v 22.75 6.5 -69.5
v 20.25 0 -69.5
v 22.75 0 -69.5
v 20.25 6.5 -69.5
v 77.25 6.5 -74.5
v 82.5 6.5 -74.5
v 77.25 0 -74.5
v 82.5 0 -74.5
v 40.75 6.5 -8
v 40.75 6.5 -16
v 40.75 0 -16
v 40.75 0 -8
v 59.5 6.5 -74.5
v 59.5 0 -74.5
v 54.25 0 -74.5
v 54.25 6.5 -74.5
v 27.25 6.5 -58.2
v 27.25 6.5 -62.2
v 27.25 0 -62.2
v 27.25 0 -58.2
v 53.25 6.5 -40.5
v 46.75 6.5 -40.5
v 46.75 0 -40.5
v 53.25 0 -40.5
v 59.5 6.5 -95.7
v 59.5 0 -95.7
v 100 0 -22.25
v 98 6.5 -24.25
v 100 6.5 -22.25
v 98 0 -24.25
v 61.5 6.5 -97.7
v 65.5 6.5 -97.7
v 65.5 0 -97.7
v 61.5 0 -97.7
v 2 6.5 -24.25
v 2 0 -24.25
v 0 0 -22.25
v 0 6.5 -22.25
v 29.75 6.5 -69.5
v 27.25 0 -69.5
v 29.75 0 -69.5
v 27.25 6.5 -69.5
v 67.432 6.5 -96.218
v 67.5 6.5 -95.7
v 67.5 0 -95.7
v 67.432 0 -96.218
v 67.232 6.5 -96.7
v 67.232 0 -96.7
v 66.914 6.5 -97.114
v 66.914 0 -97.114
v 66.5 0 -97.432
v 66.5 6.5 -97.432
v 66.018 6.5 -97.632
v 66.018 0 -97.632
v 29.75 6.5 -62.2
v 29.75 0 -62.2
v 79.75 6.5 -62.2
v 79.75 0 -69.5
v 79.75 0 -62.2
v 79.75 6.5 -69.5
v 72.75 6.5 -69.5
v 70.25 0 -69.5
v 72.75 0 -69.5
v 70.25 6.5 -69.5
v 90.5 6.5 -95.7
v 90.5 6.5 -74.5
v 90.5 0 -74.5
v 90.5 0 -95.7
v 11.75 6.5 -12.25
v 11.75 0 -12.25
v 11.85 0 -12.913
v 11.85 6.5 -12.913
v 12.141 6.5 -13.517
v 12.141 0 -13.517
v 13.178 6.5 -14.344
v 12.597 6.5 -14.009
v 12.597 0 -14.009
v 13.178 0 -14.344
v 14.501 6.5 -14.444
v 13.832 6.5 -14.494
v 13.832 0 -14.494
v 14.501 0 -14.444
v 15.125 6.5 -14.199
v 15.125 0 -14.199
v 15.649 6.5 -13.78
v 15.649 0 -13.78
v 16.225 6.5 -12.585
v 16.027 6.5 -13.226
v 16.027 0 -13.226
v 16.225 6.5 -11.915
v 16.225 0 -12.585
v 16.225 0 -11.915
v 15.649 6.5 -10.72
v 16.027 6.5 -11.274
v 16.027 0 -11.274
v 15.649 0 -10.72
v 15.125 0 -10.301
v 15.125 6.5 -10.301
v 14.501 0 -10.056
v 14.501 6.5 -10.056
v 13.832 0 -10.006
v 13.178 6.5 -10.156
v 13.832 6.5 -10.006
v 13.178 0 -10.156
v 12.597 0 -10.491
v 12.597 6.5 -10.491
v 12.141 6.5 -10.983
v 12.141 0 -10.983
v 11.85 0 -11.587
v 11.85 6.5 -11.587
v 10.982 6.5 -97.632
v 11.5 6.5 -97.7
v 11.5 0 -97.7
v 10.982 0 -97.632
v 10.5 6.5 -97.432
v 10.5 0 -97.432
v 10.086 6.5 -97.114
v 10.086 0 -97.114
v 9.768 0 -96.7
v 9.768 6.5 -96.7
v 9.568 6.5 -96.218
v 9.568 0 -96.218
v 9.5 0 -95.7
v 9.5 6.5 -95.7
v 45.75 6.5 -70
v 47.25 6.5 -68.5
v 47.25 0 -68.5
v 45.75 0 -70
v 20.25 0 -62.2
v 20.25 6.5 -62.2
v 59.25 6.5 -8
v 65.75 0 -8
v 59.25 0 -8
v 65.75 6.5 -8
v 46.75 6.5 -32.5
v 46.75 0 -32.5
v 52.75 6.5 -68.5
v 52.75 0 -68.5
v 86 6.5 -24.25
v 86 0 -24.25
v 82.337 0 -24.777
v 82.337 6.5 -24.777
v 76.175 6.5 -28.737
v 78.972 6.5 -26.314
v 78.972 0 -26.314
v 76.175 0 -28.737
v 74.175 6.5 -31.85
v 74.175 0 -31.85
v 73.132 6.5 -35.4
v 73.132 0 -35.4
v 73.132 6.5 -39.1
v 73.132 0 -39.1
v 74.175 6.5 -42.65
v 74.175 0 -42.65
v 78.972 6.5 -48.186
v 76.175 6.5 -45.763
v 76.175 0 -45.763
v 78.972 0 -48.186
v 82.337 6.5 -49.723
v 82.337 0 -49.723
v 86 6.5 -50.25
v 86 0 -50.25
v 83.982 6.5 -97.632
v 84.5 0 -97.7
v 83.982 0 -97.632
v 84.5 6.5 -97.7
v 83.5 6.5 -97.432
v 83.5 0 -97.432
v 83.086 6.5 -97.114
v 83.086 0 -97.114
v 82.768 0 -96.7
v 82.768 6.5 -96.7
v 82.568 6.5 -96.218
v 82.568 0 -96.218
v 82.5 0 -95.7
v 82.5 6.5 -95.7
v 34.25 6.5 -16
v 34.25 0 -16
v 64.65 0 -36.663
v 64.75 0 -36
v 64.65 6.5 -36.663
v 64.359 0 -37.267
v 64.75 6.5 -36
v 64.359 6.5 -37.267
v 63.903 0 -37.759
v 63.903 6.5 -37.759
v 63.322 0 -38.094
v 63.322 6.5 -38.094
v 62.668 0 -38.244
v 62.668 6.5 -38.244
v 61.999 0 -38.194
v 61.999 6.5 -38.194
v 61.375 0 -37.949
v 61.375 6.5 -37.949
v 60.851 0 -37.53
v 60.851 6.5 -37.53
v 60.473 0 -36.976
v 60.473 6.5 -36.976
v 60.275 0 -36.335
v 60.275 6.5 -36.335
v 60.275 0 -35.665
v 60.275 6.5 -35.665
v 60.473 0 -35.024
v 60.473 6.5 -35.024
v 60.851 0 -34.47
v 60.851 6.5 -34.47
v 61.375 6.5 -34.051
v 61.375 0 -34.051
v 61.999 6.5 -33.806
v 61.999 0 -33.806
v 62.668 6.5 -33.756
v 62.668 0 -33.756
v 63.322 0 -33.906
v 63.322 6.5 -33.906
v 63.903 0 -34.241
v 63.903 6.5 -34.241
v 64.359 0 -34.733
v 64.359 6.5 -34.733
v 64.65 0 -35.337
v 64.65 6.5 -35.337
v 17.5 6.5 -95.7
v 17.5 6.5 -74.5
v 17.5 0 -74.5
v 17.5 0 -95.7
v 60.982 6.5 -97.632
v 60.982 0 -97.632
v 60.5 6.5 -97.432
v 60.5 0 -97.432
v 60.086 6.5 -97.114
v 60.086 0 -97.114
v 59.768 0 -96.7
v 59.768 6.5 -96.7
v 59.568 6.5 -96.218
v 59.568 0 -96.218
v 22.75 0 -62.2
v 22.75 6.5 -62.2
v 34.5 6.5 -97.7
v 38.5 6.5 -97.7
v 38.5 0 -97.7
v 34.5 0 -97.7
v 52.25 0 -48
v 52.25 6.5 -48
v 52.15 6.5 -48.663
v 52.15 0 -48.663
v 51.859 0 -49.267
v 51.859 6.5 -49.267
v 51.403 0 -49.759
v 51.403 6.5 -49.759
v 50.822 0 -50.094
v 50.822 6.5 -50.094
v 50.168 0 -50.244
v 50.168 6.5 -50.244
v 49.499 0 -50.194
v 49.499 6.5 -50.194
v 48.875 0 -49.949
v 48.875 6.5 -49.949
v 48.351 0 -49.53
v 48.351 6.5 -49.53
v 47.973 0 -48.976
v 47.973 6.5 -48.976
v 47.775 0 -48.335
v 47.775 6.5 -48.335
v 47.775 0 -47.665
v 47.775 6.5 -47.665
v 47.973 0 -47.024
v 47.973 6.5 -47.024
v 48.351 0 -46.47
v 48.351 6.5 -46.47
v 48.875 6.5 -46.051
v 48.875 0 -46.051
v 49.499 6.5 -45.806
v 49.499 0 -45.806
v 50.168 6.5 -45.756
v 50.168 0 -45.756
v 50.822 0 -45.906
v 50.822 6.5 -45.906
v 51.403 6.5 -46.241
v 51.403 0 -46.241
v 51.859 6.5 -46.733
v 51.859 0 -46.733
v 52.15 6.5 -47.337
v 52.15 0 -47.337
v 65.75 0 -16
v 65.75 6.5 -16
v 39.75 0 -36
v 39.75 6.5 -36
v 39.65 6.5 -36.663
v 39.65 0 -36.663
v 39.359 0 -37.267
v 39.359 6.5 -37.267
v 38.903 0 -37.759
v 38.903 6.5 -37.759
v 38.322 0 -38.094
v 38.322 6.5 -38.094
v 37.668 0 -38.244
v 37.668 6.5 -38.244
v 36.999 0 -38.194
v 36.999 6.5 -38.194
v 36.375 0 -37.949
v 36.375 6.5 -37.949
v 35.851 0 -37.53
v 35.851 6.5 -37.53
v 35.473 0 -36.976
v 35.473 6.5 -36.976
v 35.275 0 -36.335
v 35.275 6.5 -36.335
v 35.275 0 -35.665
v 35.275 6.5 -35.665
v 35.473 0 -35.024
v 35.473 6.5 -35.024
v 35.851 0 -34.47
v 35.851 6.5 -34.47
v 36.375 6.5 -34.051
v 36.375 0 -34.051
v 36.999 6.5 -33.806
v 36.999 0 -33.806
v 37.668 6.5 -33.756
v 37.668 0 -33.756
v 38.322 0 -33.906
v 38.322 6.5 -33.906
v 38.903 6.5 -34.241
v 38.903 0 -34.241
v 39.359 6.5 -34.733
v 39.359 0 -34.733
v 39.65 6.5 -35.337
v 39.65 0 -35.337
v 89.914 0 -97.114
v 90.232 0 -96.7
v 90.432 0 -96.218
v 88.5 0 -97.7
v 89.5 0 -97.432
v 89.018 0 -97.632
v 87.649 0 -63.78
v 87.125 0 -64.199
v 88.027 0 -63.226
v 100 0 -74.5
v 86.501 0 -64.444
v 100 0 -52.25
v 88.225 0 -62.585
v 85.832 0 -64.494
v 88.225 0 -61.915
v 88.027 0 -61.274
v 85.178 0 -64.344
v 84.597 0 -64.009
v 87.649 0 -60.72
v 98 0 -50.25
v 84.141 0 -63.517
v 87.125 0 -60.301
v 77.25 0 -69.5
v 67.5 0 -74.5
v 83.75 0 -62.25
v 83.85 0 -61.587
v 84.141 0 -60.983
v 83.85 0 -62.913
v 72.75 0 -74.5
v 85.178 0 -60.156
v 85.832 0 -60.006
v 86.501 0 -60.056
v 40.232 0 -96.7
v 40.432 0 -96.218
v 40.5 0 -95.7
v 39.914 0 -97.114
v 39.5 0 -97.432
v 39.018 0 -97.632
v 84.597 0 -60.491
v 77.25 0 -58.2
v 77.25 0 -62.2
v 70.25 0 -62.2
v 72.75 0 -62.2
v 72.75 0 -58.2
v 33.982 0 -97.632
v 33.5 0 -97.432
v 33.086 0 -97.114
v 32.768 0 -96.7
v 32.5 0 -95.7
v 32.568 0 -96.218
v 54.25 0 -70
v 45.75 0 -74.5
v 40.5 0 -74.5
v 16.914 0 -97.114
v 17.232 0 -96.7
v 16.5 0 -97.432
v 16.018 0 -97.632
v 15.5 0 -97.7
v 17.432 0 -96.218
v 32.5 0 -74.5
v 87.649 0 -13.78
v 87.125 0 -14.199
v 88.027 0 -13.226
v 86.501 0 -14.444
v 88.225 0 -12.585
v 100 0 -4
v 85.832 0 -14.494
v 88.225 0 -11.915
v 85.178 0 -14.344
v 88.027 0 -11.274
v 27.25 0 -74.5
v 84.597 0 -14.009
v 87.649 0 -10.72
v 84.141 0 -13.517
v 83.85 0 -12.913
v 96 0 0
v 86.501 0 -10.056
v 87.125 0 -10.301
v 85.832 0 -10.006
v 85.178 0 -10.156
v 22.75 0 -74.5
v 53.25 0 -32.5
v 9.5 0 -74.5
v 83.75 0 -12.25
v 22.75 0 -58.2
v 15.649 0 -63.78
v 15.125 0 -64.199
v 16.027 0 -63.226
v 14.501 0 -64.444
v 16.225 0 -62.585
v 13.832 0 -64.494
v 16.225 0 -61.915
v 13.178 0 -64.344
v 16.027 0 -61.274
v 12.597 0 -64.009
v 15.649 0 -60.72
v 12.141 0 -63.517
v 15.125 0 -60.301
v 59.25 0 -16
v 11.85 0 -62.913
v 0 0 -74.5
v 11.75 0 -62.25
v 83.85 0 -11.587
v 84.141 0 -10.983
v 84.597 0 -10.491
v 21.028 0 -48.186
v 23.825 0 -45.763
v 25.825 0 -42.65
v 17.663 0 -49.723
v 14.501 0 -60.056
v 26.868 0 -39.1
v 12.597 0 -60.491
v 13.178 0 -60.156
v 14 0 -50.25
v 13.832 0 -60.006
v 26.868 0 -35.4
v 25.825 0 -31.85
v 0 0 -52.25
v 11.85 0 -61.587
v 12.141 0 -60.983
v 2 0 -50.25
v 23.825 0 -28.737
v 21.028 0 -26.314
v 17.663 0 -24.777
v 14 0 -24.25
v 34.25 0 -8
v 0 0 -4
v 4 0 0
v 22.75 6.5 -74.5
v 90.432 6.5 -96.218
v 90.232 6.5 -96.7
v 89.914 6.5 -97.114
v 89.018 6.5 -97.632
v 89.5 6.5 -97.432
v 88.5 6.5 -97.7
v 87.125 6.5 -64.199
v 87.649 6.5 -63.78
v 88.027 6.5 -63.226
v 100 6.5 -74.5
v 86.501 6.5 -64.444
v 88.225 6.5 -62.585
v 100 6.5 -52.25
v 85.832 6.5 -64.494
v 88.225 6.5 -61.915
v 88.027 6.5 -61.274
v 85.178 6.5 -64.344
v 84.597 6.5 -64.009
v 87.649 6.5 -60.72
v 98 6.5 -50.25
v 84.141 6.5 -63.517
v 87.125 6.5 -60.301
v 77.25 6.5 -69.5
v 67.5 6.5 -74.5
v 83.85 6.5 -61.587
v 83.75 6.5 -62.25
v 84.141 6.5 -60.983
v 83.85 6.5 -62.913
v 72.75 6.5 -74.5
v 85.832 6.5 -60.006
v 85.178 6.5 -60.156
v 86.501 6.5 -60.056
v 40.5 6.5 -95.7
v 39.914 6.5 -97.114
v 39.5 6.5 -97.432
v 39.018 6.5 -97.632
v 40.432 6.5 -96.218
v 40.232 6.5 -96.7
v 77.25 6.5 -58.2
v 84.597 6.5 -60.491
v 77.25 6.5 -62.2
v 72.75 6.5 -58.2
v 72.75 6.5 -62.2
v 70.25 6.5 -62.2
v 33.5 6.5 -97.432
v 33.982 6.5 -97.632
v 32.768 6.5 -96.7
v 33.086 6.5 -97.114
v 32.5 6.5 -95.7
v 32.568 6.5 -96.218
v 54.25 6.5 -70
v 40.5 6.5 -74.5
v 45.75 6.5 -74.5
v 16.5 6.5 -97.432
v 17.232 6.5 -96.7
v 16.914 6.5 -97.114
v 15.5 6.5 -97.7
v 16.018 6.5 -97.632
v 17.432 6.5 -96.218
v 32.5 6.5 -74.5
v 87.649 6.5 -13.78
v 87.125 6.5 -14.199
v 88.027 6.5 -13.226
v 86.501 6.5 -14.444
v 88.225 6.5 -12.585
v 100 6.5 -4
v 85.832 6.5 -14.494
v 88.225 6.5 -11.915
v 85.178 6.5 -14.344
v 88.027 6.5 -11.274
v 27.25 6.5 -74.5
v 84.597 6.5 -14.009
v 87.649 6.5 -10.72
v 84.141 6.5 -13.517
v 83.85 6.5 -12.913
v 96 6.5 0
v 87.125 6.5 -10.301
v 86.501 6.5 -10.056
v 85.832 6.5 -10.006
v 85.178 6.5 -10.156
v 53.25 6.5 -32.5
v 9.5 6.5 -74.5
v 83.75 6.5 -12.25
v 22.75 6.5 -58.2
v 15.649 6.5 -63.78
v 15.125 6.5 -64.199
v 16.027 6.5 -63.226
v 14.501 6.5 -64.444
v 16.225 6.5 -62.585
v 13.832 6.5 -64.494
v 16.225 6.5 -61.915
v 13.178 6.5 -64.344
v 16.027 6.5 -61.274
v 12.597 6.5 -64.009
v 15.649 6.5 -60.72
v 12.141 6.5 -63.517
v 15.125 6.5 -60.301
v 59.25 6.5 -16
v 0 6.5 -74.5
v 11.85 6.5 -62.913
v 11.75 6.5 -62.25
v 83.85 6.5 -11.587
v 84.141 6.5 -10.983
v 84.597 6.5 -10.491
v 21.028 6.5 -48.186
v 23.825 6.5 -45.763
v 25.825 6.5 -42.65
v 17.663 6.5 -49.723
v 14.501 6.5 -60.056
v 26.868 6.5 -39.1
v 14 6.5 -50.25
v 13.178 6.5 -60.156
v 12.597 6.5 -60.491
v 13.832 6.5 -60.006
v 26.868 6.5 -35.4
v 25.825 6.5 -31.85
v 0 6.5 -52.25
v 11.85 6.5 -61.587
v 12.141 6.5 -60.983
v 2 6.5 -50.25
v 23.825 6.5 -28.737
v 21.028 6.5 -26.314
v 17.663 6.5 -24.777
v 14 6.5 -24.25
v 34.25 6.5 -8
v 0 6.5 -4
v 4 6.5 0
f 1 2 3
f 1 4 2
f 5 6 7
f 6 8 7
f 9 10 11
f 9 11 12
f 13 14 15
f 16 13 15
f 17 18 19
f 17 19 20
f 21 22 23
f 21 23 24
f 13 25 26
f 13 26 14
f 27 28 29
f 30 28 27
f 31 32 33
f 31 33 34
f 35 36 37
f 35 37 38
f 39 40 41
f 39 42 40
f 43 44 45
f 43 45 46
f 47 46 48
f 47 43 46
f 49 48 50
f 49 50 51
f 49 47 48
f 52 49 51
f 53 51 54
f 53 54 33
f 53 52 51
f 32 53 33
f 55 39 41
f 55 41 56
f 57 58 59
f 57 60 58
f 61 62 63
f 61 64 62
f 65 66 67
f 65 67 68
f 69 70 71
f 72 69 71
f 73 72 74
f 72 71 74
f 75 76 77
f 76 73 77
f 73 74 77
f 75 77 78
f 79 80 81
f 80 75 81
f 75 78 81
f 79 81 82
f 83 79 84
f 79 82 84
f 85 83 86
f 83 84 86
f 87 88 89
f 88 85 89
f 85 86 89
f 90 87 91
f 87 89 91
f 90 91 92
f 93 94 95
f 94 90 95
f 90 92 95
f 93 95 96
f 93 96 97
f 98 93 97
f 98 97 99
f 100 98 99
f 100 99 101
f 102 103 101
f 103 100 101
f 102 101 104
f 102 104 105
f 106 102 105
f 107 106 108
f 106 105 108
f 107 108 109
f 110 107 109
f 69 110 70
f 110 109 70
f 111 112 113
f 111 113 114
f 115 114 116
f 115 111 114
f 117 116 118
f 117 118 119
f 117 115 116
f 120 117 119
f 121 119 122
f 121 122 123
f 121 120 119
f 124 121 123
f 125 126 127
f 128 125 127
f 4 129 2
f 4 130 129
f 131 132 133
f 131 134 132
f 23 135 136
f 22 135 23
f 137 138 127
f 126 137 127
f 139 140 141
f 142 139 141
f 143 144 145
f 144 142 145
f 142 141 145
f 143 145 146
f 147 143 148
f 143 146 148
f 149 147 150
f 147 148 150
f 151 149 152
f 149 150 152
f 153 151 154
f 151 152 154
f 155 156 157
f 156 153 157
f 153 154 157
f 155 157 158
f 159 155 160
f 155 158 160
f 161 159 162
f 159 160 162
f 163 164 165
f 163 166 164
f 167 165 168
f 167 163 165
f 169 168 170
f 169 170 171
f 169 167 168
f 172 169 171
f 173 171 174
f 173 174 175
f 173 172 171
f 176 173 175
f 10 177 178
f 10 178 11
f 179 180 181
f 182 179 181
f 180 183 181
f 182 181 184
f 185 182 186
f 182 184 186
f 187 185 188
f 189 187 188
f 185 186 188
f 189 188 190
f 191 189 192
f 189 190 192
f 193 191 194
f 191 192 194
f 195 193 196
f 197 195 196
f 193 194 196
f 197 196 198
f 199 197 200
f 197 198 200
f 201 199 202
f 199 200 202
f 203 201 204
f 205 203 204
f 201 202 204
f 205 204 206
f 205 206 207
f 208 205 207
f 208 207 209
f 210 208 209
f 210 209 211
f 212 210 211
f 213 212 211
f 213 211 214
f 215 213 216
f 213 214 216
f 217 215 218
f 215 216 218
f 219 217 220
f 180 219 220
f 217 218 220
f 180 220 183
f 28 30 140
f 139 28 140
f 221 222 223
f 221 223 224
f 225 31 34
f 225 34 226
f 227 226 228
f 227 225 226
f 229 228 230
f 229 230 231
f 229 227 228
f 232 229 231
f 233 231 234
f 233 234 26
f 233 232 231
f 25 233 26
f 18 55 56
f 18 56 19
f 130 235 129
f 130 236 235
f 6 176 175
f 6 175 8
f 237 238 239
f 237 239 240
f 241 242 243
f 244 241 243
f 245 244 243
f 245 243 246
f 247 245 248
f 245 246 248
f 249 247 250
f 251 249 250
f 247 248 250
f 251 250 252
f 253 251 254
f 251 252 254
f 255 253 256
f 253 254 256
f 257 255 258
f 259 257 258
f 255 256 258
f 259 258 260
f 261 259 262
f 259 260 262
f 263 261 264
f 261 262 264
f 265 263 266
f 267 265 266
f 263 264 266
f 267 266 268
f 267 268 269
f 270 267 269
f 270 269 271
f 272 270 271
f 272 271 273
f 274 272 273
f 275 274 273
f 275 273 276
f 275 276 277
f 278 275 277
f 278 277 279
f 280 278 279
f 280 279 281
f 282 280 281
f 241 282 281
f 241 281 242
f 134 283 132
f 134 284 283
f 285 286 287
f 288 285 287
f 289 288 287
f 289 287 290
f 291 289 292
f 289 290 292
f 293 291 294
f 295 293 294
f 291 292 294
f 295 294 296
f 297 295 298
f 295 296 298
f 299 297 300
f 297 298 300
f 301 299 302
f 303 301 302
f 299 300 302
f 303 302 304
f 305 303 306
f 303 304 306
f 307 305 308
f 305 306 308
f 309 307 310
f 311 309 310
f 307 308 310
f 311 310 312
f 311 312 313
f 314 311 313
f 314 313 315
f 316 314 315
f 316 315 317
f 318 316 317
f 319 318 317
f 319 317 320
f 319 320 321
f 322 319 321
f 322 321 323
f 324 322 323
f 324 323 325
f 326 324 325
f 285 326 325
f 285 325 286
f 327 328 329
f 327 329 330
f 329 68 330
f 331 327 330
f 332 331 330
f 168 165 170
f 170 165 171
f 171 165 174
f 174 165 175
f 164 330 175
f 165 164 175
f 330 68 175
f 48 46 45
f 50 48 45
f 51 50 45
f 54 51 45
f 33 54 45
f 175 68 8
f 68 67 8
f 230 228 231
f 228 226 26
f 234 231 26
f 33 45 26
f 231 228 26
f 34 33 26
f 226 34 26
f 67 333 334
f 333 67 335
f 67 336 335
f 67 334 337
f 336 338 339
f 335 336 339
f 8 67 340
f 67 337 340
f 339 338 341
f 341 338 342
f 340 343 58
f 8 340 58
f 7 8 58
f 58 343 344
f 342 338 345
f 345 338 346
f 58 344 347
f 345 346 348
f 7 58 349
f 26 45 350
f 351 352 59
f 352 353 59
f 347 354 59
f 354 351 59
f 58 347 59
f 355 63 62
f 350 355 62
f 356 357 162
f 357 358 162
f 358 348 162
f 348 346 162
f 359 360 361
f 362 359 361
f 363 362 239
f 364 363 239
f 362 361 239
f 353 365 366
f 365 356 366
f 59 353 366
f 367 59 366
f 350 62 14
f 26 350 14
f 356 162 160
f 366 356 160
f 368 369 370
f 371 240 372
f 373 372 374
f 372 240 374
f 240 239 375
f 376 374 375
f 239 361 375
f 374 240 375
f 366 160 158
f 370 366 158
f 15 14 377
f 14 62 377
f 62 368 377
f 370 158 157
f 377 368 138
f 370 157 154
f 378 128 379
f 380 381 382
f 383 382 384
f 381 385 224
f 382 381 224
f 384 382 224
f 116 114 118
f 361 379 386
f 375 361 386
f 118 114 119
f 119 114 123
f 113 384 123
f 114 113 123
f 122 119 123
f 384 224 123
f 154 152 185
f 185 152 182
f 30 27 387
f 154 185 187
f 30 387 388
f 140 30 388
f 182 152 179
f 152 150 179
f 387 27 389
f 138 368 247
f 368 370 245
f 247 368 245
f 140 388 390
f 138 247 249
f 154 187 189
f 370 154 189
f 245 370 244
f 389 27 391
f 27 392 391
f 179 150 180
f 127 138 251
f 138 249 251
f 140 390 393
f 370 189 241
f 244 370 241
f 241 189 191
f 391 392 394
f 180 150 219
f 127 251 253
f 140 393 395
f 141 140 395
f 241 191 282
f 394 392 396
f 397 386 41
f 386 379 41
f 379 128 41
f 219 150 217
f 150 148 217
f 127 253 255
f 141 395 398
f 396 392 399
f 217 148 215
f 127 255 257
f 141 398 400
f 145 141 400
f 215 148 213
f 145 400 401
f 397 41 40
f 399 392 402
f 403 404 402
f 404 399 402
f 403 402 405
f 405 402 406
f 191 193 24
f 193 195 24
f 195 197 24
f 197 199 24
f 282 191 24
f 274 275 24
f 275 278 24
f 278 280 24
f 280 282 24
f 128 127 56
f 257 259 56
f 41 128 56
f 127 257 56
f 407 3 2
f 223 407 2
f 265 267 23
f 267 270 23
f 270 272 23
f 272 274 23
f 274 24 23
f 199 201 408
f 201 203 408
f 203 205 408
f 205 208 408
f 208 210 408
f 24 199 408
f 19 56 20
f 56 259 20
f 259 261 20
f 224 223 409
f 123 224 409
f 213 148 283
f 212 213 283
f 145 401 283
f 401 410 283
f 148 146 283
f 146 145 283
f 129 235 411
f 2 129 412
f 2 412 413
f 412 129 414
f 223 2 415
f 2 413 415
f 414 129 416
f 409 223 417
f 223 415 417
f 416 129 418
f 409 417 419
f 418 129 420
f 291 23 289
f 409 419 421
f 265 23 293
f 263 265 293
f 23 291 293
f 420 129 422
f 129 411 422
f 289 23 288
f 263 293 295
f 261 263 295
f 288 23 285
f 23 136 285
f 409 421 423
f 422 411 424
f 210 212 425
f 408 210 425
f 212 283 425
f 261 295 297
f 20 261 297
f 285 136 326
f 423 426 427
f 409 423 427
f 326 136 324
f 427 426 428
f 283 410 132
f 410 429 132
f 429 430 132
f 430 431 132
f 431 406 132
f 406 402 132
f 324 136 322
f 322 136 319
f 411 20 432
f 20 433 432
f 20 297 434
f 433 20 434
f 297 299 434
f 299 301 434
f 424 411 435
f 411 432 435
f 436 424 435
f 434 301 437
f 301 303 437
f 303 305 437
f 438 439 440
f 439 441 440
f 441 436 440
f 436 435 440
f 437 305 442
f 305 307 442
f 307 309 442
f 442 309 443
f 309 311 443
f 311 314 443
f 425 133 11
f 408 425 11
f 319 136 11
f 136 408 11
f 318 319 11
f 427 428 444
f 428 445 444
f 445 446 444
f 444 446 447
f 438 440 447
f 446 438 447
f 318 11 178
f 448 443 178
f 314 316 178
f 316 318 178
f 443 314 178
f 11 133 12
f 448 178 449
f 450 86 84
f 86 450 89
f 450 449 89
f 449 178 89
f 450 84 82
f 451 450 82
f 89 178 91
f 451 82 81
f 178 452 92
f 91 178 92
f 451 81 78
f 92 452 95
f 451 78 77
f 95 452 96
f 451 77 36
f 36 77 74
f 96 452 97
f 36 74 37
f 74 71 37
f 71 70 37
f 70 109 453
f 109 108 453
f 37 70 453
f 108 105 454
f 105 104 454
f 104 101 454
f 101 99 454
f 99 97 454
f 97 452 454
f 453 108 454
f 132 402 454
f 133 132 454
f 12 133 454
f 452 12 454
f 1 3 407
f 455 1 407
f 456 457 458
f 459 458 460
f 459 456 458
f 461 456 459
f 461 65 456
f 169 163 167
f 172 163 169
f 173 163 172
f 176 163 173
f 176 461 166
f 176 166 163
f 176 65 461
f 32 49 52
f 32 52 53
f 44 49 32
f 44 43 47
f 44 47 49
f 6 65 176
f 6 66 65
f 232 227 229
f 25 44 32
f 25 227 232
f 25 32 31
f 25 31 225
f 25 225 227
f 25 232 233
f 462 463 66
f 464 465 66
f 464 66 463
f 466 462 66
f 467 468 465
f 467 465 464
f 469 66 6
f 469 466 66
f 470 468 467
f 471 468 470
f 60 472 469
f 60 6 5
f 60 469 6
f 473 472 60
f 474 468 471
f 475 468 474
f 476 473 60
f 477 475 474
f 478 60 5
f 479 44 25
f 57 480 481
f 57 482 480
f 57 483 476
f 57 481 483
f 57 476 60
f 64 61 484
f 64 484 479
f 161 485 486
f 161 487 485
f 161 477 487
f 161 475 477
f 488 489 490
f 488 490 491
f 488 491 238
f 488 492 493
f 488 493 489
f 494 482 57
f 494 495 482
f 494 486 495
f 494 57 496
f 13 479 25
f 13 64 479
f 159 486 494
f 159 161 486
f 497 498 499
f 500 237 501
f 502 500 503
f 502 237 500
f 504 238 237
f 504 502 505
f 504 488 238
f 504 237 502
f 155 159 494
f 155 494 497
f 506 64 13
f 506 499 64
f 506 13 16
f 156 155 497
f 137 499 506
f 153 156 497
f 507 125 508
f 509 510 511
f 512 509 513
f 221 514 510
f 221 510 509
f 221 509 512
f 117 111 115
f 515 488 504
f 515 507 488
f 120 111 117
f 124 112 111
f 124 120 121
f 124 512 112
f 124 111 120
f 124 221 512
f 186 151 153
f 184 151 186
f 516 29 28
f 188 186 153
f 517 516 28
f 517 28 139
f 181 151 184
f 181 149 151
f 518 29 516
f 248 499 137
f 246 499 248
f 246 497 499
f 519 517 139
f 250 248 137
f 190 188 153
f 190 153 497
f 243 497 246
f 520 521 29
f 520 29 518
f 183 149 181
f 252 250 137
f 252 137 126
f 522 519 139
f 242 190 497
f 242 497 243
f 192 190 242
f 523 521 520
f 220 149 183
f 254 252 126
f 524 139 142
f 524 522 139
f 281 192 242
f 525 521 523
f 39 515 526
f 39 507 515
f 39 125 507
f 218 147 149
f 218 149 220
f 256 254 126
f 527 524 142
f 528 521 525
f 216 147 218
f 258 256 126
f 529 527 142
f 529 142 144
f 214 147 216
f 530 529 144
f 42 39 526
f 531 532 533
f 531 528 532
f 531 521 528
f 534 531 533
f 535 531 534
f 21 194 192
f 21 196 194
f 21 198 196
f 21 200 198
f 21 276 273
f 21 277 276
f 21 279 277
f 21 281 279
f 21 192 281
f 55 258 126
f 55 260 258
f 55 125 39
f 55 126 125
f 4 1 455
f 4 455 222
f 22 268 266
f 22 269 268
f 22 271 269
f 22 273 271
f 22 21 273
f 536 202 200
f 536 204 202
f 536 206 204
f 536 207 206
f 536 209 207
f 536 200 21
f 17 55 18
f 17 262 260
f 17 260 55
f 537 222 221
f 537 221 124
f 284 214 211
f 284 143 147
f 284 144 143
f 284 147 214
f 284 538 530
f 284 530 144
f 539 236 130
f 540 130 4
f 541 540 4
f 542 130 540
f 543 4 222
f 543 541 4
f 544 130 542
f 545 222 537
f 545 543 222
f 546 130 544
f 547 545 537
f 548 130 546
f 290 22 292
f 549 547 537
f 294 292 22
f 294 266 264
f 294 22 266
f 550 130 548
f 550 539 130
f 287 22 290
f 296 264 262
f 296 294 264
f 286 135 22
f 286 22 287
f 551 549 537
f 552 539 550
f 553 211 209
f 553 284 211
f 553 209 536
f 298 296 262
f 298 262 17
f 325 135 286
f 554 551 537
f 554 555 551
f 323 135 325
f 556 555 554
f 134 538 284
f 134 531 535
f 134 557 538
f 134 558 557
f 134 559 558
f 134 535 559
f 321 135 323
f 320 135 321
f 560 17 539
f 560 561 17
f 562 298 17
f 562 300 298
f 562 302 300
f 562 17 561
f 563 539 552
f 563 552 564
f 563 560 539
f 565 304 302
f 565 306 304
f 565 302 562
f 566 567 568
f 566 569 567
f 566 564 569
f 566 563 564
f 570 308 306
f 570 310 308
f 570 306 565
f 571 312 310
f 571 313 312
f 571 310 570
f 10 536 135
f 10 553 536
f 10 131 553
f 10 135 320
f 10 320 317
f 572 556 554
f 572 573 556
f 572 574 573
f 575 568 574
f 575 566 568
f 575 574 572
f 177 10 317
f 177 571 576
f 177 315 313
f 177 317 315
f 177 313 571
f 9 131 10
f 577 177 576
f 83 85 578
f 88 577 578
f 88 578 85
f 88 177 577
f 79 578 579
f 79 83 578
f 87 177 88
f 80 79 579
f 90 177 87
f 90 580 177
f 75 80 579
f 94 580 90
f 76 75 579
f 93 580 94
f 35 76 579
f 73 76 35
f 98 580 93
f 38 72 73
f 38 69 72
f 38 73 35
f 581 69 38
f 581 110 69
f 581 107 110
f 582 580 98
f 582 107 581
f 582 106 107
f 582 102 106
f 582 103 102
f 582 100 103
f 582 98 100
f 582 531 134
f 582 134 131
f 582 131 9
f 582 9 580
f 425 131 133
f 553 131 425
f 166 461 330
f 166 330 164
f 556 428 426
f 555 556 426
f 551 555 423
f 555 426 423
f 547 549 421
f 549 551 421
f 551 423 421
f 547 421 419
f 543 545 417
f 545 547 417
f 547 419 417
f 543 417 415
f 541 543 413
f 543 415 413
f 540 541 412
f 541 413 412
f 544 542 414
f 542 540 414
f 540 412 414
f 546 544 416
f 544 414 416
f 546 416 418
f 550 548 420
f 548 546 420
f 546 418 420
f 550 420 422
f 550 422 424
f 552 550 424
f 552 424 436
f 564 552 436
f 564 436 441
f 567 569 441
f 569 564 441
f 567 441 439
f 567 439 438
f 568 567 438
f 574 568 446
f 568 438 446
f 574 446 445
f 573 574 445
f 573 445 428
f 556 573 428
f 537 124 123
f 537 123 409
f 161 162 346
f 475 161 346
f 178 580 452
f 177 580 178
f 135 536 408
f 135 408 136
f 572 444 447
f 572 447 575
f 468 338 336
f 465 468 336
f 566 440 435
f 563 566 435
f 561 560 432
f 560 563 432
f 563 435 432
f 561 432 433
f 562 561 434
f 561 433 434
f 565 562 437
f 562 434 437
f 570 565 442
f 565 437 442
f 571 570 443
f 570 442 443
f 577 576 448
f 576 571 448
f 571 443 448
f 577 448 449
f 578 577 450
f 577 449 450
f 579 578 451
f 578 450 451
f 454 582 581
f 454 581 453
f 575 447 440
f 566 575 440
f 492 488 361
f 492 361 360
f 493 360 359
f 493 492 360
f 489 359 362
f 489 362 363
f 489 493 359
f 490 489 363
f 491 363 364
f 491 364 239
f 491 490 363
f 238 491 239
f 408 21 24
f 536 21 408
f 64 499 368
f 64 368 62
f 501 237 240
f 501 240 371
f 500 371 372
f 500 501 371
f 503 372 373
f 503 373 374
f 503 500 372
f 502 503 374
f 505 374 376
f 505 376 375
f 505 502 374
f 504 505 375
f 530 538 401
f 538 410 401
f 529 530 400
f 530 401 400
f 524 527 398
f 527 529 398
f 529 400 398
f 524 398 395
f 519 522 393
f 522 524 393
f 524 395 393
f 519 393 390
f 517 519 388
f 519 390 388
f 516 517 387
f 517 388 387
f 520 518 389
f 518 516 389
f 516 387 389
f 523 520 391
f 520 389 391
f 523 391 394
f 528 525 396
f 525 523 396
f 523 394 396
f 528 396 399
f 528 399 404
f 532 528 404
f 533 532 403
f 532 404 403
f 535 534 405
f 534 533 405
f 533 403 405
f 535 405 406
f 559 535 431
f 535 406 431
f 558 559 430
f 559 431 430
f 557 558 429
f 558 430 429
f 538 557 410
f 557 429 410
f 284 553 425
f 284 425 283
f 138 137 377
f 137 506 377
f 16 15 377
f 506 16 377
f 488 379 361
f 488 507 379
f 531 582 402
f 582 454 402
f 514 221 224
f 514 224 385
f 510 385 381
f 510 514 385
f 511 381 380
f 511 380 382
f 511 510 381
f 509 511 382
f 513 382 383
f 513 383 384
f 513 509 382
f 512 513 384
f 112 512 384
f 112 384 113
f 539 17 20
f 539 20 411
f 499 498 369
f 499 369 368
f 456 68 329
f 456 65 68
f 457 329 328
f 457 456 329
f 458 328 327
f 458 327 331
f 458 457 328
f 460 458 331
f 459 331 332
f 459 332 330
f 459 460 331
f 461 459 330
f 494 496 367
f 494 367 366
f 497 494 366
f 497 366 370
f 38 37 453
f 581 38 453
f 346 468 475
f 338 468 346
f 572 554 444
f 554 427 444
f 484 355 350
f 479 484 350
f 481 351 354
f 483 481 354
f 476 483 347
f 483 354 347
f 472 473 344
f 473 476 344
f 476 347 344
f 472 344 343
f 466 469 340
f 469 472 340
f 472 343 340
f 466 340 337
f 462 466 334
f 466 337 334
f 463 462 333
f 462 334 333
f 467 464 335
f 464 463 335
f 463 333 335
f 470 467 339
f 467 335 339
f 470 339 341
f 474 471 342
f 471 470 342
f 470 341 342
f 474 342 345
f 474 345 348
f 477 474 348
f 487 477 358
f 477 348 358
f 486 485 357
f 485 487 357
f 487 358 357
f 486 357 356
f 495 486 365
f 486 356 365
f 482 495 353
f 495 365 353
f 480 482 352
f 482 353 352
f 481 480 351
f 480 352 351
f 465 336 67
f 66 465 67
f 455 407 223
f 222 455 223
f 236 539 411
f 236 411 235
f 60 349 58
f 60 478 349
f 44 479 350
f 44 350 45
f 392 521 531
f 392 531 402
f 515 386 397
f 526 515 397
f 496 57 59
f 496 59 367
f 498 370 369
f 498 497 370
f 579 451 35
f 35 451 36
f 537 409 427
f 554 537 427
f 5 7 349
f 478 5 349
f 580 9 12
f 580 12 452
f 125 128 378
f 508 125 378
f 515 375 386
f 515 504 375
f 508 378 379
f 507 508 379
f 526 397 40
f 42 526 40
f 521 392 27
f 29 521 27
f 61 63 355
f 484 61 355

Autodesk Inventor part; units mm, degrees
ref_plane "YZ Plane" through (0, 0, 0) normal (1, 0, 0) x (0, 1, 0)
ref_plane "XZ Plane" through (0, 0, 0) normal (0, 1, 0) x (-1, 0, 0)
ref_plane "XY Plane" through (0, 0, 0) normal (0, 0, 1) x (1, 0, 0)
sketch "Sketch1" plane through (0, 0, 0) normal (0, 1, 0) x (-1, 0, 0)
  line L0 (0, 0) -> (-100, 0)
  line L1 (-100, 0) -> (-100, -24.25)
  line L2 (-100, -24.25) -> (-86, -24.25)
  arc A0 (-86, -50.25) -> (-86, -24.25) centre (-86, -37.25) ccw
  line L3 (-86, -50.25) -> (-100, -50.25)
  line L4 (-100, -50.25) -> (-100, -74.5)
  line L5 (-100, -74.5) -> (0, -74.5)
  line L6 (0, -74.5) -> (0, -50.25)
  line L7 (0, -50.25) -> (-14, -50.25)
  arc A1 (-14, -24.25) -> (-14, -50.25) centre (-14, -37.25) ccw
  line L8 (-14, -24.25) -> (0, -24.25)
  line L9 (0, -24.25) -> (0, 0)
  circle A2 centre (-14, -62.25) radius 2.25
  circle A3 centre (-14, -12.25) radius 2.25
  circle A4 centre (-86, -62.25) radius 2.25
  circle A5 centre (-86, -12.25) radius 2.25
  dimension "d0" = 13
  dimension "d1" = 50
  dimension "d2" = 4.5
  dimension "d3" = 25
  dimension "d5" = 12.25
  dimension "d6" = 100
  dimension "d10" = 14
extrude "Extrusion1" add sketch "Sketch1" along normal blind 6.5
sketch "Sketch3" plane through (0, 6.5, 0) normal (0, 1, 0) x (1, 0, 0)
  line L0 (100, 74.5) -> (0, 74.5) projected
  line L1 (22.75, 74.5) -> (27.25, 74.5)
  line L2 (27.25, 58.2) -> (22.75, 58.2)
  line L3 (29.75, 69.5) -> (29.75, 62.2)
  line L4 (20.25, 62.2) -> (20.25, 69.5)
  line L5 (27.25, 74.5) -> (27.25, 69.5)
  line L6 (27.25, 62.2) -> (27.25, 58.2)
  line L7 (22.75, 58.2) -> (22.75, 62.2)
  line L8 (22.75, 69.5) -> (22.75, 74.5)
  line L9 (20.25, 69.5) -> (22.75, 69.5)
  line L10 (27.25, 69.5) -> (29.75, 69.5)
  line L11 (29.75, 62.2) -> (27.25, 62.2)
  line L12 (22.75, 62.2) -> (20.25, 62.2)
  line L13 (72.75, 74.5) -> (77.25, 74.5)
  line L14 (77.25, 58.2) -> (72.75, 58.2)
  line L15 (79.75, 69.5) -> (79.75, 62.2)
  line L16 (70.25, 62.2) -> (70.25, 69.5)
  line L17 (77.25, 74.5) -> (77.25, 69.5)
  line L18 (77.25, 62.2) -> (77.25, 58.2)
  line L19 (72.75, 58.2) -> (72.75, 62.2)
  line L20 (72.75, 69.5) -> (72.75, 74.5)
  line L21 (70.25, 69.5) -> (72.75, 69.5)
  line L22 (77.25, 69.5) -> (79.75, 69.5)
  line L23 (79.75, 62.2) -> (77.25, 62.2)
  line L24 (72.75, 62.2) -> (70.25, 62.2)
  line L25 (29.75, 65.85) -> (70.25, 65.85) construction
  point P0 (25, 58.2)
  point P1 (75, 58.2)
  point P2 (50, 65.85)
  point P3 (50, 74.5)
  dimension "d15" = 4.5
  dimension "d16" = 2.5
  dimension "d17" = 4
  dimension "d18" = 5
  dimension "d19" = 7.3
  dimension "d20" = 4.5
  dimension "d21" = 2.5
  dimension "d22" = 4
  dimension "d23" = 5
  dimension "d24" = 7.3
  dimension "d25" = 50
extrude "Extrusion2" cut sketch "Sketch3" against normal through all
sketch "Sketch4" plane through (0, 6.5, 0) normal (0, 1, 0) x (1, 0, 0)
  line L0 (22.75, 74.5) -> (0, 74.5) projected
  line L1 (100, 74.5) -> (77.25, 74.5) projected
  line L2 (77.25, 58.2) -> (72.75, 58.2) projected
  line L3 (72.75, 74.5) -> (27.25, 74.5) projected
  line L4 (27.25, 58.2) -> (22.75, 58.2) projected
  line L5 (9.5, 74.5) -> (17.5, 74.5)
  line L6 (17.5, 74.5) -> (17.5, 95.7)
  line L7 (15.5, 97.7) -> (11.5, 97.7)
  line L8 (9.5, 95.7) -> (9.5, 74.5)
  line L9 (32.5, 74.5) -> (40.5, 74.5)
  line L10 (40.5, 74.5) -> (40.5, 95.7)
  line L11 (38.5, 97.7) -> (34.5, 97.7)
  line L12 (32.5, 95.7) -> (32.5, 74.5)
  line L13 (59.5, 74.5) -> (67.5, 74.5)
  line L14 (67.5, 74.5) -> (67.5, 95.7)
  line L15 (65.5, 97.7) -> (61.5, 97.7)
  line L16 (59.5, 95.7) -> (59.5, 74.5)
  line L17 (82.5, 74.5) -> (90.5, 74.5)
  line L18 (90.5, 74.5) -> (90.5, 95.7)
  line L19 (88.5, 97.7) -> (84.5, 97.7)
  line L20 (82.5, 95.7) -> (82.5, 74.5)
  arc A0 (11.5, 97.7) -> (9.5, 95.7) centre (11.5, 95.7) ccw
  arc A1 (17.5, 95.7) -> (15.5, 97.7) centre (15.5, 95.7) ccw
  arc A2 (34.5, 97.7) -> (32.5, 95.7) centre (34.5, 95.7) ccw
  arc A3 (40.5, 95.7) -> (38.5, 97.7) centre (38.5, 95.7) ccw
  arc A4 (61.5, 97.7) -> (59.5, 95.7) centre (61.5, 95.7) ccw
  arc A5 (67.5, 95.7) -> (65.5, 97.7) centre (65.5, 95.7) ccw
  arc A6 (84.5, 97.7) -> (82.5, 95.7) centre (84.5, 95.7) ccw
  arc A7 (90.5, 95.7) -> (88.5, 97.7) centre (88.5, 95.7) ccw
  point P0 (25, 58.2)
  point P1 (75, 58.2)
  dimension "d28" = 2
  dimension "d29" = 23.2
  dimension "d30" = 8
  dimension "d31" = 8
  dimension "d32" = 8
  dimension "d33" = 8
  dimension "d34" = 15
  dimension "d35" = 15
  dimension "d36" = 7.5
  dimension "d37" = 7.5
extrude "Extrusion3" add sketch "Sketch4" against normal blind 6.5
chamfer "Chamfer1" distance 4 angle 45 2 edges at (100, 3.25, 0) (0, 3.25, 0)
chamfer "Chamfer2" distance 2 angle 45 4 edges at (100, 3.25, -24.25) (100, 3.25, -50.25) (0, 3.25, -50.25) (0, 3.25, -24.25)
sketch "Sketch5" plane through (0, 6.5, 0) normal (0, 1, 0) x (1, 0, 0)
  line L0 (4, 0) -> (96, 0) projected
  line L1 (34.25, 16) -> (40.75, 16)
  line L2 (40.75, 16) -> (40.75, 8)
  line L3 (40.75, 8) -> (34.25, 8)
  line L4 (34.25, 8) -> (34.25, 16)
  line L5 (59.25, 16) -> (65.75, 16)
  line L6 (65.75, 16) -> (65.75, 8)
  line L7 (65.75, 8) -> (59.25, 8)
  line L8 (59.25, 8) -> (59.25, 16)
  circle A0 centre (37.5, 36) radius 2.25
  circle A1 centre (62.5, 36) radius 2.25
  line L9 (37.5, 36) -> (62.5, 36) construction
  point P0 (0, 0)
  point P1 (37.5, 16)
  point P2 (62.5, 16)
  point P3 (50, 36)
  point P4 (50, 0)
  dimension "d46" = 4.5
  dimension "d47" = 6.5
  dimension "d48" = 8
  dimension "d49" = 25
  dimension "d50" = 8
  dimension "d51" = 20
extrude "Extrusion4" cut sketch "Sketch5" against normal through all
sketch "Sketch6" plane through (0, 6.5, 0) normal (0, 1, 0) x (1, 0, 0)
  line L0 (59.5, 74.5) -> (40.5, 74.5) projected
  line L1 (46.75, 40.5) -> (53.25, 40.5)
  line L2 (53.25, 40.5) -> (53.25, 32.5)
  line L3 (53.25, 32.5) -> (46.75, 32.5)
  line L4 (46.75, 32.5) -> (46.75, 40.5)
  circle A0 centre (50, 48) radius 2.25
  point P0 (0, 0)
  point P1 (50, 74.5)
  point P2 (50, 40.5)
  dimension "d54" = 6.5
  dimension "d55" = 8
  dimension "d56" = 4.5
  dimension "d57" = 7.5
  dimension "d58" = 34
extrude "Extrusion5" cut sketch "Sketch6" against normal through all
sketch "Sketch7" plane through (0, 0, 0) normal (0, -1, 0) x (1, 0, 0)
  line L0 (59.5, -74.5) -> (40.5, -74.5) projected
  line L1 (45.75, -74.5) -> (54.25, -74.5)
  line L2 (54.25, -74.5) -> (54.25, -68.5)
  line L3 (54.25, -68.5) -> (45.75, -68.5)
  line L4 (45.75, -68.5) -> (45.75, -74.5)
  point P0 (0, 0)
  point P1 (50, -68.5)
  point P2 (50, -74.5)
  dimension "d61" = 8.5
  dimension "d62" = 6
extrude "Extrusion6" cut sketch "Sketch7" against normal through all
chamfer "Chamfer3" distance 1.5 angle 45 2 edges at (54.25, 3.25, -68.5) (45.75, 3.25, -68.5)
equation "\"d3\" = 0.5 * d1"
equation "\"d31\" = d30"
equation "\"d32\" = d31"
equation "\"d33\" = d32"
equation "\"d36\" = 0.5 * d34"
equation "\"d37\" = 0.5 * d35"
properties part number "x_carryage_extruder_mount" material "Plywood, Finish"
